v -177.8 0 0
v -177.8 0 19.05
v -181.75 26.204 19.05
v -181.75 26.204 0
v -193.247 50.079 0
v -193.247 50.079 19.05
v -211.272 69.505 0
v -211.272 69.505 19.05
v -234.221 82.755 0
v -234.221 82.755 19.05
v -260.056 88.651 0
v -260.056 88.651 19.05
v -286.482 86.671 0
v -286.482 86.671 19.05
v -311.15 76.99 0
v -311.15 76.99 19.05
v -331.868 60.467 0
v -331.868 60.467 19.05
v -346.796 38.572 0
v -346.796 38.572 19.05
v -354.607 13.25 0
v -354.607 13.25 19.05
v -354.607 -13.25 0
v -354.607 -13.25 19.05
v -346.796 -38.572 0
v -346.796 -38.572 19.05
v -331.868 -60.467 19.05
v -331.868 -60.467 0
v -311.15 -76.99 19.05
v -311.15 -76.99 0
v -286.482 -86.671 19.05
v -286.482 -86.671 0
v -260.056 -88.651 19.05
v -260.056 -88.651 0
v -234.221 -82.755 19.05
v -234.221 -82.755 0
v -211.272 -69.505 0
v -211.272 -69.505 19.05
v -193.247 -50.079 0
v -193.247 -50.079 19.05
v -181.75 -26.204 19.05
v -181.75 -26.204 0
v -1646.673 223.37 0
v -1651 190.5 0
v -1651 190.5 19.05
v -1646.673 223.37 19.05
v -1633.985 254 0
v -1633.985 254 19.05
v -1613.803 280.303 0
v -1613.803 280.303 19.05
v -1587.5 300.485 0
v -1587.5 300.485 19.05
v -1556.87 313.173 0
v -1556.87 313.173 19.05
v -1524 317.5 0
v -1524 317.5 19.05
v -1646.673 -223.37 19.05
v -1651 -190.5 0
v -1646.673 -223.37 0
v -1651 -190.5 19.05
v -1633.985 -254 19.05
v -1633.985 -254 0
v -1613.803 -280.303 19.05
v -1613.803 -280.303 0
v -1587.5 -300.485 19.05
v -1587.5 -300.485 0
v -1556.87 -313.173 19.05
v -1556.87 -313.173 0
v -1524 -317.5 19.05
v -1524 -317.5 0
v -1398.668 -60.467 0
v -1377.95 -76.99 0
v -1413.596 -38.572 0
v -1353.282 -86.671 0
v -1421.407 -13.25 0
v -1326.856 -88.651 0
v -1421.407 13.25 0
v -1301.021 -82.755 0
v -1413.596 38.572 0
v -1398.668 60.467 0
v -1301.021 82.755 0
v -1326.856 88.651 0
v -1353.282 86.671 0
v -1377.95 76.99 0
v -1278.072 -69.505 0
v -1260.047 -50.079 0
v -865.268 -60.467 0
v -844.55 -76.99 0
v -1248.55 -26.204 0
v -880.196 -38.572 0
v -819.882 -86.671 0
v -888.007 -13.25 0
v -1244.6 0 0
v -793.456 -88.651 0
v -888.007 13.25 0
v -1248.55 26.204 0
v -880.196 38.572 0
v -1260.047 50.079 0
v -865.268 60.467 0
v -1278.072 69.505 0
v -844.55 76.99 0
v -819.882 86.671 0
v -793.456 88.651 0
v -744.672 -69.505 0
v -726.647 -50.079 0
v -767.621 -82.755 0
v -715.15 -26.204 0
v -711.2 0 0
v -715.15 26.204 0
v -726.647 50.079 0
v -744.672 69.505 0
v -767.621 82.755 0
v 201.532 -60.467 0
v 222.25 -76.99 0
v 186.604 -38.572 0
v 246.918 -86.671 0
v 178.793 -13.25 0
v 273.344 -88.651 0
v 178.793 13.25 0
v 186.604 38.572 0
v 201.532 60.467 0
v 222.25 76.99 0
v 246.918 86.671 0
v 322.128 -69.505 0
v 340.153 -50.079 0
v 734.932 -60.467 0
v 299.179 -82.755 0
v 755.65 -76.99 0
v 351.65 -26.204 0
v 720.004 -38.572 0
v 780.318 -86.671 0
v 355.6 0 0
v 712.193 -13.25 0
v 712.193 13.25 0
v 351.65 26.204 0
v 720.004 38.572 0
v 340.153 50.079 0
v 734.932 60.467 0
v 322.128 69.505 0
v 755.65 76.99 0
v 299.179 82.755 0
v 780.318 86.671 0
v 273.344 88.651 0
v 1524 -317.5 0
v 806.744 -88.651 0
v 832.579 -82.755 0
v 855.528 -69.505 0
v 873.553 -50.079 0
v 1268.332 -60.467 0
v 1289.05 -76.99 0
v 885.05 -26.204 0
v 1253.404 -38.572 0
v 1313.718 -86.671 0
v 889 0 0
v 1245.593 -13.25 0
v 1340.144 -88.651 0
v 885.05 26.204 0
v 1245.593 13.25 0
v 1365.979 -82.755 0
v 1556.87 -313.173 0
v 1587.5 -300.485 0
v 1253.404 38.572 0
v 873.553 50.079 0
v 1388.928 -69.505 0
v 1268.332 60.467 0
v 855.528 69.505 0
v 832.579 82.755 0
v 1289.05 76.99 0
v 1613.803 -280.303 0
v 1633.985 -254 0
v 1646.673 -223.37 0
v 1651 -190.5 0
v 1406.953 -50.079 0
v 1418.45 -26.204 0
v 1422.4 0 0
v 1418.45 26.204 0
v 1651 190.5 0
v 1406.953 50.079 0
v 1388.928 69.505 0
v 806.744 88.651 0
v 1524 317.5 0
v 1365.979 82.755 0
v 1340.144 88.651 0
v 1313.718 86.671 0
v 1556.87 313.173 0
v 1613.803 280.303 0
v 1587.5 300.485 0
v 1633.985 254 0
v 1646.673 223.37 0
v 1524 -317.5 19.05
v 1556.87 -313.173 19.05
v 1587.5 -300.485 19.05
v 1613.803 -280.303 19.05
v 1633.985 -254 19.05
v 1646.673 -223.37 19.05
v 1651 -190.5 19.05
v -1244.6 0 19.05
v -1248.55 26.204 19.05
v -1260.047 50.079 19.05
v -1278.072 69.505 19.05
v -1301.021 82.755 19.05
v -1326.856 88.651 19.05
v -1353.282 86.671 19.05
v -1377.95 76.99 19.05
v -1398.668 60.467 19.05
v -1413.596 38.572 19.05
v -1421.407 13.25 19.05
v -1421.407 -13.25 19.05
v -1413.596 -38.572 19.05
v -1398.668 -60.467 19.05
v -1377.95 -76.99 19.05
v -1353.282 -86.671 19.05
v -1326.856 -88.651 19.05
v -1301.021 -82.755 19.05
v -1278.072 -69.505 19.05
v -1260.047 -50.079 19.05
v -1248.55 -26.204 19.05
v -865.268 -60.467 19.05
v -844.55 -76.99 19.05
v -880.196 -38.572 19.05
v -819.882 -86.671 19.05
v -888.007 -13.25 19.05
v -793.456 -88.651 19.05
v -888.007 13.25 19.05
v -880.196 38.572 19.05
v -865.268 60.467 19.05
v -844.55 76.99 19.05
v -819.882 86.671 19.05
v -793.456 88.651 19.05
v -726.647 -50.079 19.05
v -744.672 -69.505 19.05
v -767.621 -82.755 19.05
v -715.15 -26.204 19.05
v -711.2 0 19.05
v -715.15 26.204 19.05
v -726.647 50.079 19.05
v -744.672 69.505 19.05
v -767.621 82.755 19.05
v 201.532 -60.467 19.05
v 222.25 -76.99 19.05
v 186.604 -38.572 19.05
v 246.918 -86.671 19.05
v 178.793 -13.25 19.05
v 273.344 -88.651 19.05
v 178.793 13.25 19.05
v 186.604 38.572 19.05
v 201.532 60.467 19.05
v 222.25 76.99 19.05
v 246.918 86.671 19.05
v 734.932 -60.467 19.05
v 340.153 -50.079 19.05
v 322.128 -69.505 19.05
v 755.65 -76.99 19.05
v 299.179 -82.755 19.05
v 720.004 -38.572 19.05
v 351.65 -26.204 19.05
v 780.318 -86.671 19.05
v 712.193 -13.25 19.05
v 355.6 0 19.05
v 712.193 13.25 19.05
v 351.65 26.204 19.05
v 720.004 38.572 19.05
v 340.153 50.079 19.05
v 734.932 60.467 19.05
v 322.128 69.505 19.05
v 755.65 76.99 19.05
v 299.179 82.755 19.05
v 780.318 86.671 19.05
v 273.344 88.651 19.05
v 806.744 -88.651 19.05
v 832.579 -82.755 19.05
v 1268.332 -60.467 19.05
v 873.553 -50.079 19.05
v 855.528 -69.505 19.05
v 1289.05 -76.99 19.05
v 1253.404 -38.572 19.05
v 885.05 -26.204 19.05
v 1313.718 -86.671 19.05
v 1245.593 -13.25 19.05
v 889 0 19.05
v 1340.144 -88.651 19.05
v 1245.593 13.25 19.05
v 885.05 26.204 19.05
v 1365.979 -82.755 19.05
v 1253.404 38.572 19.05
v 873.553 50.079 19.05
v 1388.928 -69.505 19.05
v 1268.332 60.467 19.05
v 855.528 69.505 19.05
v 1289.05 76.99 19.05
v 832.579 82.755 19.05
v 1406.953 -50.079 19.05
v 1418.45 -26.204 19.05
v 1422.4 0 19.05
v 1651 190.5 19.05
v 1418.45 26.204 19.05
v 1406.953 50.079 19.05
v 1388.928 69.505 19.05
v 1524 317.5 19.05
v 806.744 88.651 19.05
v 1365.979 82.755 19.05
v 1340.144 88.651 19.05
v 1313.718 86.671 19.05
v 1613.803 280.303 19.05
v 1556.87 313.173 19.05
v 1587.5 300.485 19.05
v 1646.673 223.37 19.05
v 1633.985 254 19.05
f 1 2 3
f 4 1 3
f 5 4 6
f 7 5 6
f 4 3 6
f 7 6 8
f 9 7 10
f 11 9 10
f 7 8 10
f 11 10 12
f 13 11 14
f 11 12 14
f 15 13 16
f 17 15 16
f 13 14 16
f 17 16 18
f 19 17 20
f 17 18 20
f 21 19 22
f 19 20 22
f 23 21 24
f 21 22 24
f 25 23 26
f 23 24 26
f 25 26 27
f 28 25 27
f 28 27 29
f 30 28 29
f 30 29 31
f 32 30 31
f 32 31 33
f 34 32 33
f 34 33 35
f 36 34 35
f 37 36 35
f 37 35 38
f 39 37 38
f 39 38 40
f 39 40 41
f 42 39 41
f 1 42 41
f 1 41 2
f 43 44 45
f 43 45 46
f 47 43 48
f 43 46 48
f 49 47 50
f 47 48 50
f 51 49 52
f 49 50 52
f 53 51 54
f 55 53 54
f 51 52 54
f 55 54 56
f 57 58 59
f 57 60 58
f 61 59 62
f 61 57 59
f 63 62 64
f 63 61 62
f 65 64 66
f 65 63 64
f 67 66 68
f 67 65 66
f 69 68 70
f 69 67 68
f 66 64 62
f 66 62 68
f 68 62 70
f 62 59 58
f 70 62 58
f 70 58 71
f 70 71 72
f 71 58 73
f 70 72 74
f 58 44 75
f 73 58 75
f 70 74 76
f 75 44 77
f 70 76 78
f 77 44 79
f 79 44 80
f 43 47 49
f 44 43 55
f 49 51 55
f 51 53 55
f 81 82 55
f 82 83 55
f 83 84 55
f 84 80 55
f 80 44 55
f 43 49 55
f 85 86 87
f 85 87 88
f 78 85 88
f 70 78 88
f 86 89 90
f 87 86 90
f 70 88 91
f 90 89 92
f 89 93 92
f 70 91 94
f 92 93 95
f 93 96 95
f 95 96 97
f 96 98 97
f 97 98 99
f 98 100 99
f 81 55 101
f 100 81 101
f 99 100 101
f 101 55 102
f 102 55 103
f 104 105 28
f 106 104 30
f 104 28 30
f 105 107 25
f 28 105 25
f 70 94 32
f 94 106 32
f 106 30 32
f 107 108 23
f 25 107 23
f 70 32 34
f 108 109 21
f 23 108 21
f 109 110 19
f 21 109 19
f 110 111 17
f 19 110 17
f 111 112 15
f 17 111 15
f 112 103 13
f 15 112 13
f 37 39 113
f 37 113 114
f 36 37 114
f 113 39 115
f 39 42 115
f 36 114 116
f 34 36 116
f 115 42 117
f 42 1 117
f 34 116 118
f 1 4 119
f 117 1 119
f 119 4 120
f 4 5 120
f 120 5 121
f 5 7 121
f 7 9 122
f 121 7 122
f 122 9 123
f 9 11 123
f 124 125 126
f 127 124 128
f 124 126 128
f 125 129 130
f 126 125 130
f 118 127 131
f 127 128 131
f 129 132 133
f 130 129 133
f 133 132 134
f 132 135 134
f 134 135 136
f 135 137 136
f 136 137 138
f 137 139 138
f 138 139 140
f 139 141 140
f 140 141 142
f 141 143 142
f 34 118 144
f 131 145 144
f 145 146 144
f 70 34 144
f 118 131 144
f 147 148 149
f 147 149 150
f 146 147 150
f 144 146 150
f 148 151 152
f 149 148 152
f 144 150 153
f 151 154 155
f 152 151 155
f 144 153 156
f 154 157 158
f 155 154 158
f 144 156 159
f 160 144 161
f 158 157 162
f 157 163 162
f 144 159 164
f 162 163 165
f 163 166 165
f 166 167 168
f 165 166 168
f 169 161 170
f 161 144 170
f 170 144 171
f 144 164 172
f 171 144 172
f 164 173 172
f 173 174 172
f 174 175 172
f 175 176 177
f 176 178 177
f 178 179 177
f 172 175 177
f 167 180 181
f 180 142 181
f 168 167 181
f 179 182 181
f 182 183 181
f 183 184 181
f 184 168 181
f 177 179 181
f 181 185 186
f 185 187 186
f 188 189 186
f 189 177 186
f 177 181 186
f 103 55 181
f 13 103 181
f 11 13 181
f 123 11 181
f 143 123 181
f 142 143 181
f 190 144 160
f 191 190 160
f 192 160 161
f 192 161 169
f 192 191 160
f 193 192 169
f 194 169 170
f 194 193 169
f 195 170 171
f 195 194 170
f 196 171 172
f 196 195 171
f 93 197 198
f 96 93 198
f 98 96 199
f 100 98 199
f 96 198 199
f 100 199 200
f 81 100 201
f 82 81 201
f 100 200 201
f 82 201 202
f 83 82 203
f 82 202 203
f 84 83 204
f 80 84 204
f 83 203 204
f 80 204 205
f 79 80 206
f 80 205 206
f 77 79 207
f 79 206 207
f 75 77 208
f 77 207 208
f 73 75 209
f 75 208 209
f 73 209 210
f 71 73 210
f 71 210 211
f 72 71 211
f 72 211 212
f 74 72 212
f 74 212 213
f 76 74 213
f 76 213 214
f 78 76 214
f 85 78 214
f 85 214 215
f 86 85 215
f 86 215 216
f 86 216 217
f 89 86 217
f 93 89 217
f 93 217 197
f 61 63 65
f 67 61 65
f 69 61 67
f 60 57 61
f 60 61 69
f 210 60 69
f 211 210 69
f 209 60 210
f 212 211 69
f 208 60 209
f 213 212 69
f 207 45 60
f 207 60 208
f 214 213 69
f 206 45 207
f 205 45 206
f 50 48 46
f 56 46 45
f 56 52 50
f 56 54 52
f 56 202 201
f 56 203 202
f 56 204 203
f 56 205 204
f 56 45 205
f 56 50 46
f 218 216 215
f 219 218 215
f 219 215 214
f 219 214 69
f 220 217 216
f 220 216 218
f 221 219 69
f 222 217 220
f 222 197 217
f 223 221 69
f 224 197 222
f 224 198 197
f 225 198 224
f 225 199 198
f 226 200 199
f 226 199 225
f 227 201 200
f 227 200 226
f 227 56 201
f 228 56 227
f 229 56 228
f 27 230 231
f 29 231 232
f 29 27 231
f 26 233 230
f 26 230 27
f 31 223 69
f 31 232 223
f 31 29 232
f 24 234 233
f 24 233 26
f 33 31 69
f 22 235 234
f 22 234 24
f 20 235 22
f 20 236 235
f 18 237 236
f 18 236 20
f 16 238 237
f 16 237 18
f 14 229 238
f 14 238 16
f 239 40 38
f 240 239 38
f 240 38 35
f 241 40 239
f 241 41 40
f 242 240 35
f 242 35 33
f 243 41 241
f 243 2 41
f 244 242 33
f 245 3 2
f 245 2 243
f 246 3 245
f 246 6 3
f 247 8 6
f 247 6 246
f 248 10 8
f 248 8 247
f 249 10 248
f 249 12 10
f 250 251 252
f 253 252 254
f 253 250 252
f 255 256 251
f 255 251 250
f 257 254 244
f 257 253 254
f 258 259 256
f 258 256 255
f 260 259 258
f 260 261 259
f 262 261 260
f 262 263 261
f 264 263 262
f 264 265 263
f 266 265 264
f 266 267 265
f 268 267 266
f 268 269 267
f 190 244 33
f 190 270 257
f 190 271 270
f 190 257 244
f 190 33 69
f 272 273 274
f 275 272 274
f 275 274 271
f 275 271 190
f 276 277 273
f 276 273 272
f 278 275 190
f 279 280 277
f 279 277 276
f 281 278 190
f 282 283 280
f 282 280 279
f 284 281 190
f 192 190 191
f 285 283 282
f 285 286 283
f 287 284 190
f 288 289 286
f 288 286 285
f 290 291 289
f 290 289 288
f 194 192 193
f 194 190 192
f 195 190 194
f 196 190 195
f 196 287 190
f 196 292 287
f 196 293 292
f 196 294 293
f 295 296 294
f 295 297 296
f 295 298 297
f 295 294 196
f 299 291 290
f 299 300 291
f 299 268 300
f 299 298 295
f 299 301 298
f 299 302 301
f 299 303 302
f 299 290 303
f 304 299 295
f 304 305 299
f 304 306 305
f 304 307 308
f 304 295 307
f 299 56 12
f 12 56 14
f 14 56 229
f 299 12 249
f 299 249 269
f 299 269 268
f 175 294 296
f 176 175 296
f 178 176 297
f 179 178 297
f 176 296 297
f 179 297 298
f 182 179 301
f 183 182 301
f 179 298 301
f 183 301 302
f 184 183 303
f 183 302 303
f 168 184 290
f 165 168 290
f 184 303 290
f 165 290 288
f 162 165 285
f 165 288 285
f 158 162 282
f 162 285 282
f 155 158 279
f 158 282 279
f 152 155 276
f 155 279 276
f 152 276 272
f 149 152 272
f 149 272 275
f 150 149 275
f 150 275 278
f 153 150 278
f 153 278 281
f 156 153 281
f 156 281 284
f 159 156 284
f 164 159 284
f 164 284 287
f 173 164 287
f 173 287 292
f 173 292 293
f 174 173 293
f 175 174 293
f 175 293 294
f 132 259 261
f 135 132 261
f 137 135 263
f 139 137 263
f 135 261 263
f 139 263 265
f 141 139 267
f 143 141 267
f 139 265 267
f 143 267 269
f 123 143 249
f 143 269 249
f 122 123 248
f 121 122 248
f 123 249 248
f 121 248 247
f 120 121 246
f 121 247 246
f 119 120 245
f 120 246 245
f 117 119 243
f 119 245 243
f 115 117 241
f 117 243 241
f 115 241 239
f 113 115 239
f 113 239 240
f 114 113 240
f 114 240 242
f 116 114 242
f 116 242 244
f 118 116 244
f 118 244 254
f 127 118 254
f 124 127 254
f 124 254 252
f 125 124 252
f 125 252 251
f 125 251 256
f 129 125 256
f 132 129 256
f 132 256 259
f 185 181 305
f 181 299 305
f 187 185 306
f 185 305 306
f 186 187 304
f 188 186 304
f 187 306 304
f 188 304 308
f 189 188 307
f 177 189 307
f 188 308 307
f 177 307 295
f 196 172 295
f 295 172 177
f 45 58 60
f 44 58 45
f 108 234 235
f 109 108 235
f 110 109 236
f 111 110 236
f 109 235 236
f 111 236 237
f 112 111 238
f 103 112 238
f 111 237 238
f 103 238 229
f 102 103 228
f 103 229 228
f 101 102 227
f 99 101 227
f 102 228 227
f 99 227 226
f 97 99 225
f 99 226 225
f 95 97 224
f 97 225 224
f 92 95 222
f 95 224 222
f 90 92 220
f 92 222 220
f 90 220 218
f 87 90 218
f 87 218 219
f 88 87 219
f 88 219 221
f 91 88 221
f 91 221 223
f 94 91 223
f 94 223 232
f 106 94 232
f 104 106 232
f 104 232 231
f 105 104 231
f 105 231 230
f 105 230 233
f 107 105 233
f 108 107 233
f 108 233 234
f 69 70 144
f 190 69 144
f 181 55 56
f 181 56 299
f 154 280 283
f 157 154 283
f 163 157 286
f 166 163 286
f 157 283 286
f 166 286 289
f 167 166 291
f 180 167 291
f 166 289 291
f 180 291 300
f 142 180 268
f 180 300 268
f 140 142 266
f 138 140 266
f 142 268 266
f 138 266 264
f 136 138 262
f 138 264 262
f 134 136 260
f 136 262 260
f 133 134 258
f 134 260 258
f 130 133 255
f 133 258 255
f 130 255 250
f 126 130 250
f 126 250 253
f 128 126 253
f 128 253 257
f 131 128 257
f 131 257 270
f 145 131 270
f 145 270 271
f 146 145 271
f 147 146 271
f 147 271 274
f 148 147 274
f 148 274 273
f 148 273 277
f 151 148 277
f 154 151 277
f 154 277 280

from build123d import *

# Parameters (mm, degrees)
SKETCH1_W           = 3302
SKETCH1_H           = 635
BOSS_EXTRUDE1_DEPTH = 19.05
SKETCH2_R           = 88.9
CUT_EXTRUDE1_DEPTH  = 1682.359614271
FILLET1_R           = 127


with BuildPart() as part:
    # Sketch1 → Boss-Extrude1 (new body)
    with BuildSketch(Plane.XY):
        Rectangle(SKETCH1_W, SKETCH1_H)
    extrude(amount=BOSS_EXTRUDE1_DEPTH)

    # Sketch2 → Cut-Extrude1 (cut, through all)
    with BuildSketch(Plane.XY.offset(19.05)):
        with Locations((-1333.5, 0)):
            Circle(SKETCH2_R)
        with Locations((-800.1, 0)):
            Circle(SKETCH2_R)
        with Locations((-266.7, 0)):
            Circle(SKETCH2_R)
        with Locations((266.7, 0)):
            Circle(SKETCH2_R)
        with Locations((800.1, 0)):
            Circle(SKETCH2_R)
        with Locations((1333.5, 0)):
            Circle(SKETCH2_R)
    extrude(amount=-CUT_EXTRUDE1_DEPTH, mode=Mode.SUBTRACT)

    # Fillet1
    fillet1_edges = [part.edges().sort_by_distance(p)[0] for p in [
        (1651, -317.5, 9.525),
        (-1651, -317.5, 9.525),
        (-1651, 317.5, 9.525),
        (1651, 317.5, 9.525),
    ]]
    fillet(fillet1_edges, radius=FILLET1_R)


solid = part.part
